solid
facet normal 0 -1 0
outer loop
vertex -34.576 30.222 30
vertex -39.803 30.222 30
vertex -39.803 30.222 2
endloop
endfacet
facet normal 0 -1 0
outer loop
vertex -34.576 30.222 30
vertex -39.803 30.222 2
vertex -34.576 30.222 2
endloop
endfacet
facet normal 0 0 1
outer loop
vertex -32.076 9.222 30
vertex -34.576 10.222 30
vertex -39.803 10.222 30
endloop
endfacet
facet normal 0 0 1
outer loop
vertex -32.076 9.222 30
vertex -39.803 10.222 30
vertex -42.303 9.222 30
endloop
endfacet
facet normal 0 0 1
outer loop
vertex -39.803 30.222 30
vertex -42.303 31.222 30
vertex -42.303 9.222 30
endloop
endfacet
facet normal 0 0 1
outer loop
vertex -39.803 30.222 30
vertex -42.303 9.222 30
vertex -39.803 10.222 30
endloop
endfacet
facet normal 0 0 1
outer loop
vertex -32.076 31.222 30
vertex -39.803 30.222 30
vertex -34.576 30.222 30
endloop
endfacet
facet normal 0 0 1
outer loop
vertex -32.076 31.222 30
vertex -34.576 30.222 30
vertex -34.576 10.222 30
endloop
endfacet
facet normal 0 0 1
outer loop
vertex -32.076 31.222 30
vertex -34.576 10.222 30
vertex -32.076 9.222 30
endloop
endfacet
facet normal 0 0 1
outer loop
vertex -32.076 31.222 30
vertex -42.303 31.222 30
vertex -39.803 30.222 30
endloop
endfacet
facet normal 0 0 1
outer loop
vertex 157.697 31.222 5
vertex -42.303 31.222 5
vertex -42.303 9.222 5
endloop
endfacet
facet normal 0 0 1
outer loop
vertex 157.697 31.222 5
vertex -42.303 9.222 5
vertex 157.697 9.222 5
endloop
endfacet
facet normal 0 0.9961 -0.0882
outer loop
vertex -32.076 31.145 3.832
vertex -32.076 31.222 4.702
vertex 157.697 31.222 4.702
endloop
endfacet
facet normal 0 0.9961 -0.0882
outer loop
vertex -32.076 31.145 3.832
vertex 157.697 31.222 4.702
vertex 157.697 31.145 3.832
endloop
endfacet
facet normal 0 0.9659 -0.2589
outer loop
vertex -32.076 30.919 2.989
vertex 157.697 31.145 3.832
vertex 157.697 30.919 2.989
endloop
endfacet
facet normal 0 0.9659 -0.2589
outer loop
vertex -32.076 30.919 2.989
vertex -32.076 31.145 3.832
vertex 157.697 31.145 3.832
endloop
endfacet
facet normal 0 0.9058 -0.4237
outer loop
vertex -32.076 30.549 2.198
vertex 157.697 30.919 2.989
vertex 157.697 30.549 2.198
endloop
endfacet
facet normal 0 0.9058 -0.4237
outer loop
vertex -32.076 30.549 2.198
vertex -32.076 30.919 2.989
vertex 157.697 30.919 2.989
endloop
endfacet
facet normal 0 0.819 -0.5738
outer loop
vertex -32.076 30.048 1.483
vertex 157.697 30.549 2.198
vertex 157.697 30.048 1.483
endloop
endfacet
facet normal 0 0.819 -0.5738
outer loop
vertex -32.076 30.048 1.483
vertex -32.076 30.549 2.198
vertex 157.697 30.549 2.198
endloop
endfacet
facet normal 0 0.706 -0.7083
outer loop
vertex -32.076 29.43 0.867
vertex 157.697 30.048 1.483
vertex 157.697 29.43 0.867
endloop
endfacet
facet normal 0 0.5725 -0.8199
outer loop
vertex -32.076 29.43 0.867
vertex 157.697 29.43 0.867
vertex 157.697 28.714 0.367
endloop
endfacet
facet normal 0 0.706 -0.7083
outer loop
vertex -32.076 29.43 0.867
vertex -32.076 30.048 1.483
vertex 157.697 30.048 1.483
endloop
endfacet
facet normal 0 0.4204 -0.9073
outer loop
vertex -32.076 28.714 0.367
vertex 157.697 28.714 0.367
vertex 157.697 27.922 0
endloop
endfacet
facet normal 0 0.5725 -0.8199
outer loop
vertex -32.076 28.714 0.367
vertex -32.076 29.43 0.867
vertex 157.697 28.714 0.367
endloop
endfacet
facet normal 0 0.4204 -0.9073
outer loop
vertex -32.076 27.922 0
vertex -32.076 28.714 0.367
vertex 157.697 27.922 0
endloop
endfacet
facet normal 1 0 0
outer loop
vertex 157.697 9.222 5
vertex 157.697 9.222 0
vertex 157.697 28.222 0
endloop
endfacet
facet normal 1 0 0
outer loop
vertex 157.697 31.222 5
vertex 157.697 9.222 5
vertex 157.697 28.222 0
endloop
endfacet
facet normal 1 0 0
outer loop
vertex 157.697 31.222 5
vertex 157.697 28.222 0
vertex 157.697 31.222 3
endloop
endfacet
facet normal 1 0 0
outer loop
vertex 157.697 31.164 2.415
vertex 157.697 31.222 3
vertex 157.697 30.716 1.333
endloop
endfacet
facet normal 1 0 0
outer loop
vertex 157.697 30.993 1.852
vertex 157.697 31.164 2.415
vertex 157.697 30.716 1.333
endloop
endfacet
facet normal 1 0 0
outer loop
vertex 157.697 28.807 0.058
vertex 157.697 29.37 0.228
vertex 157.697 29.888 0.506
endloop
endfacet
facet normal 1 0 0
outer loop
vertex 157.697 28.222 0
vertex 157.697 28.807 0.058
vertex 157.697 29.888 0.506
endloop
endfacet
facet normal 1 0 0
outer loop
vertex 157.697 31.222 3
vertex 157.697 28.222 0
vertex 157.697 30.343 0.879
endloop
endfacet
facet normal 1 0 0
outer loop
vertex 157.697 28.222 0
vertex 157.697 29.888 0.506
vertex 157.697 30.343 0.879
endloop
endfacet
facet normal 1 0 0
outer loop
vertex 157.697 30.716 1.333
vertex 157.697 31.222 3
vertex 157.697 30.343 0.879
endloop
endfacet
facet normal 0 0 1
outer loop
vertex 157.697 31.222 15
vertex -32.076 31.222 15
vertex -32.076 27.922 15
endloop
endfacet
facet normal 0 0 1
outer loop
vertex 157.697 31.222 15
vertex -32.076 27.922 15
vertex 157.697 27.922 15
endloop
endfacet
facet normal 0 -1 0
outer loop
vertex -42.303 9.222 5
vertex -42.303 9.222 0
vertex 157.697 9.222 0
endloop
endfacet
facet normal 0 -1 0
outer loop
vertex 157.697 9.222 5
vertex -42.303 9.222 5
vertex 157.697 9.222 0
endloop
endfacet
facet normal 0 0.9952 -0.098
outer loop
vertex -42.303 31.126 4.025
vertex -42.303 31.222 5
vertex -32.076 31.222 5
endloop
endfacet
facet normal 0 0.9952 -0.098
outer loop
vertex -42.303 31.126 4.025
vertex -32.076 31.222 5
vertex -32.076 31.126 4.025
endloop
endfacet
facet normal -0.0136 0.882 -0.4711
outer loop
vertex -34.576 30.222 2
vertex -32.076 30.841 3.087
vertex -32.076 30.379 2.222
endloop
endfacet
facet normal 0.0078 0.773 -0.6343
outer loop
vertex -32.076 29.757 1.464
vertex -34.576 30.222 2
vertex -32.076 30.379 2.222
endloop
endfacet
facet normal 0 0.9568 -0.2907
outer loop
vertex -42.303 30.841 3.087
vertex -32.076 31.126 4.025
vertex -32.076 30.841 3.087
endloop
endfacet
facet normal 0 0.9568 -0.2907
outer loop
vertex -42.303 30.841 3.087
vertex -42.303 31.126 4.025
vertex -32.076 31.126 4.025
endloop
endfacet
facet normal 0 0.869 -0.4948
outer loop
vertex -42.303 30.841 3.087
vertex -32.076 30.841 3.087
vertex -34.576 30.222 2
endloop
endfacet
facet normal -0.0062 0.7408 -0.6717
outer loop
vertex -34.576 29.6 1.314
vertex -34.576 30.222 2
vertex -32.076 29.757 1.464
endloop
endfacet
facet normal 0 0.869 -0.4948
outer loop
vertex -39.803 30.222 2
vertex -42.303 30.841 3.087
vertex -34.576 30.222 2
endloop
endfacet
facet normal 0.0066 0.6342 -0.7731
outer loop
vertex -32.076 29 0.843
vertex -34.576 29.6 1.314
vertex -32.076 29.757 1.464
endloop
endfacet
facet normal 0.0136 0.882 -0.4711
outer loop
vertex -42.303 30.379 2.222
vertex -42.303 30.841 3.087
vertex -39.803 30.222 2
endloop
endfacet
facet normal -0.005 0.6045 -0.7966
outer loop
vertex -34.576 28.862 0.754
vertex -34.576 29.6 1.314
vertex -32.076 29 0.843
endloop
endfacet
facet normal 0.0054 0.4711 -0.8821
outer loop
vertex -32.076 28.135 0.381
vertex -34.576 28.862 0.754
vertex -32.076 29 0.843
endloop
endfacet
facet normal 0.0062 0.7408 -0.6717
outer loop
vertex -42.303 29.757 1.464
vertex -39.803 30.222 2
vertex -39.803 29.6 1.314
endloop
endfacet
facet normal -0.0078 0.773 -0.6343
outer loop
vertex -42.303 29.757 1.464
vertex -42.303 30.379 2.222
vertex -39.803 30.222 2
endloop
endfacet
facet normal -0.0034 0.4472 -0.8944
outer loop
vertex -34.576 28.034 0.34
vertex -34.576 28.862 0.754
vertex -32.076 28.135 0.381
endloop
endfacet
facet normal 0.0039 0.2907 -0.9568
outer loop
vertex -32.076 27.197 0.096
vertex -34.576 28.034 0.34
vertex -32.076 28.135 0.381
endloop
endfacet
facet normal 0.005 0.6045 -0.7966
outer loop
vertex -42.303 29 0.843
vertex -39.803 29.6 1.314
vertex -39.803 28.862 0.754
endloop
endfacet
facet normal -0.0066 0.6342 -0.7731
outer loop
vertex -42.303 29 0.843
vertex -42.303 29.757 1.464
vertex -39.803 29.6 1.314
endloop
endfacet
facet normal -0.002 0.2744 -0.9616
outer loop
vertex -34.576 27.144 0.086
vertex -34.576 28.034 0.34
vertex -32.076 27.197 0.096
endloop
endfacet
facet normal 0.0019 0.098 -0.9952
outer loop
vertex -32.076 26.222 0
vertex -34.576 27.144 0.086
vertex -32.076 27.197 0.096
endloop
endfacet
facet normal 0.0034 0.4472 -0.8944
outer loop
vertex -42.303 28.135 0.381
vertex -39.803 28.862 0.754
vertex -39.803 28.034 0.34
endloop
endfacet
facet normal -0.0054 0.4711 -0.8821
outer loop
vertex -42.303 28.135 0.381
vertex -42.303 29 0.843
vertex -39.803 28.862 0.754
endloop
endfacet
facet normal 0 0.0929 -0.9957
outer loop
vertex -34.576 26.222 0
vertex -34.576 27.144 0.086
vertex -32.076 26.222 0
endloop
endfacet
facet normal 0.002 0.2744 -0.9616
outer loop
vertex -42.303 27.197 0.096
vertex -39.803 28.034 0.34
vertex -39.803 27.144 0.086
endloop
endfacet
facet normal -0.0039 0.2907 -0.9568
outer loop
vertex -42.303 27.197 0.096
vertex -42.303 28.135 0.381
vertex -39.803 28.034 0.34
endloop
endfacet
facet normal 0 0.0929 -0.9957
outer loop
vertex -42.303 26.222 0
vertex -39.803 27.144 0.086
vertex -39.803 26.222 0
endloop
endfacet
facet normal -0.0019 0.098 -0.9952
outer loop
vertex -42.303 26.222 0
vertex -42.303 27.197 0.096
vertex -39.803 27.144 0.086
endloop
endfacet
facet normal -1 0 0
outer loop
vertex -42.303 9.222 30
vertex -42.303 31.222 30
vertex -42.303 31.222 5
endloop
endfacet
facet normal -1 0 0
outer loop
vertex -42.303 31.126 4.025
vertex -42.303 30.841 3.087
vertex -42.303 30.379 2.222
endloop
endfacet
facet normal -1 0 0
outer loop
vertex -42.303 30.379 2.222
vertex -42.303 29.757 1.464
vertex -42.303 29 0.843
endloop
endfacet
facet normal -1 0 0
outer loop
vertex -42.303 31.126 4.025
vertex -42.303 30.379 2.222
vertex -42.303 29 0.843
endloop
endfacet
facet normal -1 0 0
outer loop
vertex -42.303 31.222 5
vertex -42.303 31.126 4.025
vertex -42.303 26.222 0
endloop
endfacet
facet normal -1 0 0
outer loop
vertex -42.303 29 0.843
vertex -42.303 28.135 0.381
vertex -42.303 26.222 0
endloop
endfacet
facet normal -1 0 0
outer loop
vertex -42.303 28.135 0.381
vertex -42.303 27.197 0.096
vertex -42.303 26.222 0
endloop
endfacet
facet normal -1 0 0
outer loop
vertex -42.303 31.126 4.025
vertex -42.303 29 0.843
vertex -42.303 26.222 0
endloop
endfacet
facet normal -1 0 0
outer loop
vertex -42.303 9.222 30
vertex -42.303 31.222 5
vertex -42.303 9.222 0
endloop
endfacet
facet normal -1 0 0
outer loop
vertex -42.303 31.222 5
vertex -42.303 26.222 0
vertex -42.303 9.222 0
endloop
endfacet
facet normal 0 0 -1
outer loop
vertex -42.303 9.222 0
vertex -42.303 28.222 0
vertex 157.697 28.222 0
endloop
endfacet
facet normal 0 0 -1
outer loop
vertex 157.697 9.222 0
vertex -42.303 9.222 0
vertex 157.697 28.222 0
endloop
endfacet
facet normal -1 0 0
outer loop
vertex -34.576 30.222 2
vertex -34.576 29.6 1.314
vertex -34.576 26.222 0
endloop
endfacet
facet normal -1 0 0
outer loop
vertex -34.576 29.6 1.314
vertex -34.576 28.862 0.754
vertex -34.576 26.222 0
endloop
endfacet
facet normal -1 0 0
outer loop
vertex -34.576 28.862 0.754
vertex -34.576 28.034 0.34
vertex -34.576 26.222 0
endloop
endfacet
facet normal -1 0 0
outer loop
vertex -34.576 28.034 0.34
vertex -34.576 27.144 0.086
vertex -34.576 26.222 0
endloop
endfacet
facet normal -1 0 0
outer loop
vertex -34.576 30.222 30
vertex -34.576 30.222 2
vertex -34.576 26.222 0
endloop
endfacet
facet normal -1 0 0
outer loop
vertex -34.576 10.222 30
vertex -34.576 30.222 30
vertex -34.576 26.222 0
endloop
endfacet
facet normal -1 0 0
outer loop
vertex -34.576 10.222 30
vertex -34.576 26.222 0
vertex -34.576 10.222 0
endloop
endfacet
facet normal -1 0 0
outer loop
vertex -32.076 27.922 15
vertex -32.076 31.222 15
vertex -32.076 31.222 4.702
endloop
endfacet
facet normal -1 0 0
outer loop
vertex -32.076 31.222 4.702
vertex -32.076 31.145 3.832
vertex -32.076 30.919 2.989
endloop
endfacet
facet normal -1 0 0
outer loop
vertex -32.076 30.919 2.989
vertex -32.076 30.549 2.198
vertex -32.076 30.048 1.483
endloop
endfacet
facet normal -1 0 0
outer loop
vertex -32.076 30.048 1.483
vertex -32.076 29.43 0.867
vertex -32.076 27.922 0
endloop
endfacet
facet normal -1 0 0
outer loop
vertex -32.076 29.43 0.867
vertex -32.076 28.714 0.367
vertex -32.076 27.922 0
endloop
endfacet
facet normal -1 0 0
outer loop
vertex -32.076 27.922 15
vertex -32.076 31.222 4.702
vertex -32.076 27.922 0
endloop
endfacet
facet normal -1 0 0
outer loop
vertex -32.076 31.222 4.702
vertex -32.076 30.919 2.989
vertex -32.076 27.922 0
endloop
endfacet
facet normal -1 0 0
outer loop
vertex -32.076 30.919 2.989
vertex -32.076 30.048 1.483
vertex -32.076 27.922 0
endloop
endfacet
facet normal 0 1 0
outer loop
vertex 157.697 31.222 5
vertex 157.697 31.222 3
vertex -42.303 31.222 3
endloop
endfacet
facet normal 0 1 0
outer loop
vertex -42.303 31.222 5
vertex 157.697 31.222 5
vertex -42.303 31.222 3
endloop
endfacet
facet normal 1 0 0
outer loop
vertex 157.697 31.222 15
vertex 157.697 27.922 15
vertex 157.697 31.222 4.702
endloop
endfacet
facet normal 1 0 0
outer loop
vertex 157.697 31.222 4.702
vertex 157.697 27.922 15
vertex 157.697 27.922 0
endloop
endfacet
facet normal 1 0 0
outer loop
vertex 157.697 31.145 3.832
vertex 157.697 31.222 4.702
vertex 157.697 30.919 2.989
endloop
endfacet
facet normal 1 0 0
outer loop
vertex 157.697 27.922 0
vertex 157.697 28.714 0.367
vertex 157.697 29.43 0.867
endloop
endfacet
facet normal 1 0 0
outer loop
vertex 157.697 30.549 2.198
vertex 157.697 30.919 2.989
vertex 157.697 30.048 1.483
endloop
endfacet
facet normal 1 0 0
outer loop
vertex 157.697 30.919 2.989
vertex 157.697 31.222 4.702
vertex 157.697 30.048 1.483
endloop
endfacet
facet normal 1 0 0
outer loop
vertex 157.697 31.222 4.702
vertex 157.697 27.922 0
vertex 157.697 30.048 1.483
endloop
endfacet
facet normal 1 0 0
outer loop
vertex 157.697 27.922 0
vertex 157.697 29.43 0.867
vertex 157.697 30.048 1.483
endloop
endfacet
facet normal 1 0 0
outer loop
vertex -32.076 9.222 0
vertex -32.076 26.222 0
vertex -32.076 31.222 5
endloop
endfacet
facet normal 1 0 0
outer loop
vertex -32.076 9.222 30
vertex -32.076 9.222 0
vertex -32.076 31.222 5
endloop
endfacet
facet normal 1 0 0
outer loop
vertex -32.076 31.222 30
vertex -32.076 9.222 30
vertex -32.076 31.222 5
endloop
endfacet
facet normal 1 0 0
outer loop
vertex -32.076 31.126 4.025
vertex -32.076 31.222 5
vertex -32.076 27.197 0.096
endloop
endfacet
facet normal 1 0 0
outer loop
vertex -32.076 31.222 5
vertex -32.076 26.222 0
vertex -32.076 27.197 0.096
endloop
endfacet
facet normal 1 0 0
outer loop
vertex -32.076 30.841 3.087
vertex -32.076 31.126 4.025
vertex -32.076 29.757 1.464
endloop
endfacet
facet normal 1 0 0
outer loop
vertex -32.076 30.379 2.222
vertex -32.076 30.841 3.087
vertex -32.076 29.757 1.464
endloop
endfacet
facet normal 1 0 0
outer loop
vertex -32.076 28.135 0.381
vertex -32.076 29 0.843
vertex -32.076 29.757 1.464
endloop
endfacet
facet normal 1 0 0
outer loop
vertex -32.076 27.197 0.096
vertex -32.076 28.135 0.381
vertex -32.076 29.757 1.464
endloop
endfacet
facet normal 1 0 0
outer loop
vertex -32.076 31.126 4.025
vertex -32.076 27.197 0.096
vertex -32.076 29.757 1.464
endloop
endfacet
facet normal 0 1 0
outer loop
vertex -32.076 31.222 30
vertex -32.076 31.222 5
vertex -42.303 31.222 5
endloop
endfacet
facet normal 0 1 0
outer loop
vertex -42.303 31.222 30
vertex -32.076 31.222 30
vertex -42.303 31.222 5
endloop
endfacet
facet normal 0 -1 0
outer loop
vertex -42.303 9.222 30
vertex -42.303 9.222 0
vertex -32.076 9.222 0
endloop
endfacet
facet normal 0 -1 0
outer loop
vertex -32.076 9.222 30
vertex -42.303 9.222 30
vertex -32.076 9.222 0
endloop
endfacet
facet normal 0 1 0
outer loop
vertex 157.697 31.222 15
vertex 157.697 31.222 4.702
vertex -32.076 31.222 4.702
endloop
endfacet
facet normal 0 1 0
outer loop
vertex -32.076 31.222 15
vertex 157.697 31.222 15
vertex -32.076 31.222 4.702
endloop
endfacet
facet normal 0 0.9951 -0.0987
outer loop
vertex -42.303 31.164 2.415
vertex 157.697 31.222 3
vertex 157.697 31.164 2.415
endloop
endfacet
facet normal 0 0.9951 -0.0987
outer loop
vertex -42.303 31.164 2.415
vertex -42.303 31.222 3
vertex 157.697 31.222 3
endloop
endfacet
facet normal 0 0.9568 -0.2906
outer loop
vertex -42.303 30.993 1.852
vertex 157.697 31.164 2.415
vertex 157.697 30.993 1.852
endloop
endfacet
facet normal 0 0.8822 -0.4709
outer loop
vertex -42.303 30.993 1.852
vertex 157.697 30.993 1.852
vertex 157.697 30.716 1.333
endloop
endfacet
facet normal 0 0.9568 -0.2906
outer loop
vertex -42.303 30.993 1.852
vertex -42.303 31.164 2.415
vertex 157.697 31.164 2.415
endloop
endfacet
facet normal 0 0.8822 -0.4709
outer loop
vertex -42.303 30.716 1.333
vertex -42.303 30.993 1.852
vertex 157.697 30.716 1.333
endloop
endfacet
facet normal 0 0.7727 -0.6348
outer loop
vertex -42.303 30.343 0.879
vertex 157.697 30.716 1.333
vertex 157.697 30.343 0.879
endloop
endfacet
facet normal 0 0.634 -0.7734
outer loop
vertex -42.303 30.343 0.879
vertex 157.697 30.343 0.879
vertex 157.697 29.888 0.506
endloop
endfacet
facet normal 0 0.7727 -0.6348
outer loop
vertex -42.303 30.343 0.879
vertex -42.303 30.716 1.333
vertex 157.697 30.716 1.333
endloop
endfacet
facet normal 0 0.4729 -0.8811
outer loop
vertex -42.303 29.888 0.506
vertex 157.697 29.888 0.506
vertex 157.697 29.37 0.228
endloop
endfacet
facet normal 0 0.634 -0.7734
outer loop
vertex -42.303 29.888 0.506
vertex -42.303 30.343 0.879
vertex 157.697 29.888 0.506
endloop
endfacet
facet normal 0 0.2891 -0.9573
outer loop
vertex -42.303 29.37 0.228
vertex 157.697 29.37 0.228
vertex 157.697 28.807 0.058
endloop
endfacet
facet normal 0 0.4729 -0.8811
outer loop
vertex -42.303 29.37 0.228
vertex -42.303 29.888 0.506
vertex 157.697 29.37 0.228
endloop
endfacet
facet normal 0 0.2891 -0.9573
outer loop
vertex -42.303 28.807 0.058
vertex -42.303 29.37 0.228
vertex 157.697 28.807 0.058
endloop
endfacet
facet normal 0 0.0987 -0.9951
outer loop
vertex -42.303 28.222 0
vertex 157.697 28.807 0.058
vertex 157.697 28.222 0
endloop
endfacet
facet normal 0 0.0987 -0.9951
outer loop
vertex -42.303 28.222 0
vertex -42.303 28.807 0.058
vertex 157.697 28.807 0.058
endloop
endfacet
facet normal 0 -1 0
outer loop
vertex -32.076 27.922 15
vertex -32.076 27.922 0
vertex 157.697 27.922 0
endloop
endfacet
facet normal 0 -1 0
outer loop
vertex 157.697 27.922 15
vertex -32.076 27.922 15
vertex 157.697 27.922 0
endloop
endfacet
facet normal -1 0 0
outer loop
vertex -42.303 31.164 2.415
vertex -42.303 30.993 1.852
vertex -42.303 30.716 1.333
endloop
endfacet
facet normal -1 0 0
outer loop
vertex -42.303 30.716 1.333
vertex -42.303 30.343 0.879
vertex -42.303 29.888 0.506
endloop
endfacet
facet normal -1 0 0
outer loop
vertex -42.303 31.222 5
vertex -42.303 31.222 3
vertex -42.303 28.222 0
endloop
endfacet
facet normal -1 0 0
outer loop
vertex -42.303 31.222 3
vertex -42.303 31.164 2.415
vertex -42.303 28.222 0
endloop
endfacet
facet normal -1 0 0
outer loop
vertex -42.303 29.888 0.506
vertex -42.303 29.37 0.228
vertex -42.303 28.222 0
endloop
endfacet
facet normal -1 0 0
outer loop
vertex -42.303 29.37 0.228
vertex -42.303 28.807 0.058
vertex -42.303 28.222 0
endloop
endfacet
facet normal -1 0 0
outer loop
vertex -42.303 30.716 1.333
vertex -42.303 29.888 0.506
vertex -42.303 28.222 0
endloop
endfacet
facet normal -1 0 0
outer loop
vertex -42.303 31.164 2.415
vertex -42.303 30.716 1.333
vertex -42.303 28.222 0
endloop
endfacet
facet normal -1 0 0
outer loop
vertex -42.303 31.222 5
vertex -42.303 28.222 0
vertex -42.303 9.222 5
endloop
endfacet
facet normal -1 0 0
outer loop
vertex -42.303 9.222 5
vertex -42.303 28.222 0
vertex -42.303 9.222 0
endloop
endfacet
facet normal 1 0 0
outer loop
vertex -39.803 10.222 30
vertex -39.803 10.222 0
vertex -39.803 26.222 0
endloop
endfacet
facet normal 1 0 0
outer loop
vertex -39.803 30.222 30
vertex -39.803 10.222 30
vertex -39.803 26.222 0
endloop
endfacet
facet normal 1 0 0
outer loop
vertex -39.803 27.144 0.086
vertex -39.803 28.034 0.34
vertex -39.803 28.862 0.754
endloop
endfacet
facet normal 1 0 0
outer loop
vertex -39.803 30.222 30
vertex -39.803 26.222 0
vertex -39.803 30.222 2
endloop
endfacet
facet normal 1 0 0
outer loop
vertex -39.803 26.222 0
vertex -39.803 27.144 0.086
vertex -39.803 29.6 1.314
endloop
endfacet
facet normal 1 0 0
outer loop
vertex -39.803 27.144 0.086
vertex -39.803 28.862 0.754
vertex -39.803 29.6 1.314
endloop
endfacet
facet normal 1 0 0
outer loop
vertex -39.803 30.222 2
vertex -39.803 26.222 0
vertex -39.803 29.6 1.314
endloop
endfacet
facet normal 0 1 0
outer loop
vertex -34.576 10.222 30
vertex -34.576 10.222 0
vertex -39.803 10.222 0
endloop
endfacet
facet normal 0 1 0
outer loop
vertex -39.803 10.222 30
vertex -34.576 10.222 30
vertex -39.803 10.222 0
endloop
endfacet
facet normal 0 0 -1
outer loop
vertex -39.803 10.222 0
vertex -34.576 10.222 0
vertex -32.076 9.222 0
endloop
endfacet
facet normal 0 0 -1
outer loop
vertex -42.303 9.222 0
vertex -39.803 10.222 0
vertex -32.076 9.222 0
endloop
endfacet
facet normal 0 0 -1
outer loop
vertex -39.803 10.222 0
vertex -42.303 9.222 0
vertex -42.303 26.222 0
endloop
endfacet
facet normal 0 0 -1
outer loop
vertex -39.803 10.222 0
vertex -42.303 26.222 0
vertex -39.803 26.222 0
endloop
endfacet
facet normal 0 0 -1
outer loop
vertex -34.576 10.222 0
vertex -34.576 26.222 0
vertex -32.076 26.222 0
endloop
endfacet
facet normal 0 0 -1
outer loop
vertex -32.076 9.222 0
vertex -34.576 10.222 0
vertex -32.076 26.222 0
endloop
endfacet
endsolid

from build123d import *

# Parameters (mm, degrees)
F0_W          = 5.2268145978
F0_H          = 17.7
F0_H_2        = 2.3
F0_W_2        = 2.5
F1_DEPTH      = 5
F2_DEPTH      = 30
F3_DEPTH      = 15
F4_T1_DEPTH   = 35.2268145978
F4_2_T1_DEPTH = 213.2838212932
F5_R          = 3


# Not quite as in the source:
# - a fillet or chamfer that OpenCascade refuses, or shapes differently, is made with other operations: its cross-section is extruded or revolved along the edge and cut away or added


with BuildPart() as f1:
    # F0 (on Top) → F1 (new body)
    with BuildSketch(Plane.XY):
        with Locations((-37.1891043335, 19.0716543853)):
            Rectangle(F0_W, F0_H)
        Polygon((157.6974883676, 9.2216543853), (157.6974883676, 27.9216543853), (-32.0756970346, 27.9216543853), (-32.0756970346, 10.2216543853), (-32.0756970346, 9.2216543853), align=None)
        with Locations((-37.1891043335, 29.0716543853)):
            Rectangle(F0_W, F0_H_2)
        Polygon((-39.8025116324, 10.2216543853), (-42.3025116324, 10.2216543853), (-42.3025116324, 9.2216543853), (-32.0756970346, 9.2216543853), (-32.0756970346, 10.2216543853), (-34.5756970346, 10.2216543853), align=None)
        with Locations((-33.3256970346, 19.0716543853)):
            Rectangle(F0_W_2, F0_H)
        with Locations((-41.0525116324, 19.0716543853)):
            Rectangle(F0_W_2, F0_H)
        with Locations((-41.0525116324, 29.0716543853)):
            Rectangle(F0_W_2, F0_H_2)
        Polygon((-32.0756970346, 31.2216543853), (-42.3025116324, 31.2216543853), (-42.3025116324, 30.2216543853), (-39.8025116324, 30.2216543853), (-34.5756970346, 30.2216543853), (-32.0756970346, 30.2216543853), align=None)
        with Locations((-33.3256970346, 29.0716543853)):
            Rectangle(F0_W_2, F0_H_2)
        Polygon((157.6974883676, 31.2216543853), (-32.0756970346, 31.2216543853), (-32.0756970346, 30.2216543853), (-32.0756970346, 27.9216543853), (157.6974883676, 27.9216543853), align=None)
    extrude(amount=F1_DEPTH)

    # F5
    f5_edges = [f1.edges().sort_by_distance(p)[0] for p in [
        (57.697488, 31.221654, 0),
    ]]
    fillet(f5_edges, radius=F5_R)


with BuildPart() as f2:
    # F0 (on Top) → F2 (new body)
    with BuildSketch(Plane.XY):
        Polygon((-32.0756970346, 31.2216543853), (-42.3025116324, 31.2216543853), (-42.3025116324, 30.2216543853), (-39.8025116324, 30.2216543853), (-34.5756970346, 30.2216543853), (-32.0756970346, 30.2216543853), align=None)
        with Locations((-33.3256970346, 29.0716543853)):
            Rectangle(F0_W_2, F0_H_2)
        with Locations((-33.3256970346, 19.0716543853)):
            Rectangle(F0_W_2, F0_H)
        with Locations((-41.0525116324, 29.0716543853)):
            Rectangle(F0_W_2, F0_H_2)
        with Locations((-41.0525116324, 19.0716543853)):
            Rectangle(F0_W_2, F0_H)
        Polygon((-39.8025116324, 10.2216543853), (-42.3025116324, 10.2216543853), (-42.3025116324, 9.2216543853), (-32.0756970346, 9.2216543853), (-32.0756970346, 10.2216543853), (-34.5756970346, 10.2216543853), align=None)
    extrude(amount=F2_DEPTH)

    # F4: fillet of radius 5 on 1 edges, made by hand

    # F4_s2 → F4_t1 (cut)
    with BuildSketch(Plane.YZ.offset(-54.8025116324)):
        with BuildLine():
            ThreePointArc((31.2216543853, 5), (29.7571882913, 1.4644660941), (26.2216543853, 0))
            Line((26.2216543853, 0), (31.2216543853, 0))
            Line((31.2216543853, 0), (31.2216543853, 5))
        make_face()
    extrude(amount=F4_T1_DEPTH, mode=Mode.SUBTRACT)


with BuildPart() as f3:
    # F0 (on Top) → F3 (new body)
    with BuildSketch(Plane.XY):
        Polygon((157.6974883676, 31.2216543853), (-32.0756970346, 31.2216543853), (-32.0756970346, 30.2216543853), (-32.0756970346, 27.9216543853), (157.6974883676, 27.9216543853), align=None)
    extrude(amount=F3_DEPTH)

    # F4#2: fillet of radius 5 on 1 edges, made by hand

    # F4_2_s2 → F4_2_t1 (cut)
    with BuildSketch(Plane.YZ.offset(-43.8310149801)):
        with BuildLine():
            ThreePointArc((31.2216543853, 4.7021271782), (30.3143307713, 1.8298458549), (27.9216543853, 0))
            Line((27.9216543853, 0), (31.2216543853, 0))
            Line((31.2216543853, 0), (31.2216543853, 4.7021271782))
        make_face()
    extrude(amount=F4_2_T1_DEPTH, mode=Mode.SUBTRACT)


solid = Compound([f1.part, f2.part, f3.part])
